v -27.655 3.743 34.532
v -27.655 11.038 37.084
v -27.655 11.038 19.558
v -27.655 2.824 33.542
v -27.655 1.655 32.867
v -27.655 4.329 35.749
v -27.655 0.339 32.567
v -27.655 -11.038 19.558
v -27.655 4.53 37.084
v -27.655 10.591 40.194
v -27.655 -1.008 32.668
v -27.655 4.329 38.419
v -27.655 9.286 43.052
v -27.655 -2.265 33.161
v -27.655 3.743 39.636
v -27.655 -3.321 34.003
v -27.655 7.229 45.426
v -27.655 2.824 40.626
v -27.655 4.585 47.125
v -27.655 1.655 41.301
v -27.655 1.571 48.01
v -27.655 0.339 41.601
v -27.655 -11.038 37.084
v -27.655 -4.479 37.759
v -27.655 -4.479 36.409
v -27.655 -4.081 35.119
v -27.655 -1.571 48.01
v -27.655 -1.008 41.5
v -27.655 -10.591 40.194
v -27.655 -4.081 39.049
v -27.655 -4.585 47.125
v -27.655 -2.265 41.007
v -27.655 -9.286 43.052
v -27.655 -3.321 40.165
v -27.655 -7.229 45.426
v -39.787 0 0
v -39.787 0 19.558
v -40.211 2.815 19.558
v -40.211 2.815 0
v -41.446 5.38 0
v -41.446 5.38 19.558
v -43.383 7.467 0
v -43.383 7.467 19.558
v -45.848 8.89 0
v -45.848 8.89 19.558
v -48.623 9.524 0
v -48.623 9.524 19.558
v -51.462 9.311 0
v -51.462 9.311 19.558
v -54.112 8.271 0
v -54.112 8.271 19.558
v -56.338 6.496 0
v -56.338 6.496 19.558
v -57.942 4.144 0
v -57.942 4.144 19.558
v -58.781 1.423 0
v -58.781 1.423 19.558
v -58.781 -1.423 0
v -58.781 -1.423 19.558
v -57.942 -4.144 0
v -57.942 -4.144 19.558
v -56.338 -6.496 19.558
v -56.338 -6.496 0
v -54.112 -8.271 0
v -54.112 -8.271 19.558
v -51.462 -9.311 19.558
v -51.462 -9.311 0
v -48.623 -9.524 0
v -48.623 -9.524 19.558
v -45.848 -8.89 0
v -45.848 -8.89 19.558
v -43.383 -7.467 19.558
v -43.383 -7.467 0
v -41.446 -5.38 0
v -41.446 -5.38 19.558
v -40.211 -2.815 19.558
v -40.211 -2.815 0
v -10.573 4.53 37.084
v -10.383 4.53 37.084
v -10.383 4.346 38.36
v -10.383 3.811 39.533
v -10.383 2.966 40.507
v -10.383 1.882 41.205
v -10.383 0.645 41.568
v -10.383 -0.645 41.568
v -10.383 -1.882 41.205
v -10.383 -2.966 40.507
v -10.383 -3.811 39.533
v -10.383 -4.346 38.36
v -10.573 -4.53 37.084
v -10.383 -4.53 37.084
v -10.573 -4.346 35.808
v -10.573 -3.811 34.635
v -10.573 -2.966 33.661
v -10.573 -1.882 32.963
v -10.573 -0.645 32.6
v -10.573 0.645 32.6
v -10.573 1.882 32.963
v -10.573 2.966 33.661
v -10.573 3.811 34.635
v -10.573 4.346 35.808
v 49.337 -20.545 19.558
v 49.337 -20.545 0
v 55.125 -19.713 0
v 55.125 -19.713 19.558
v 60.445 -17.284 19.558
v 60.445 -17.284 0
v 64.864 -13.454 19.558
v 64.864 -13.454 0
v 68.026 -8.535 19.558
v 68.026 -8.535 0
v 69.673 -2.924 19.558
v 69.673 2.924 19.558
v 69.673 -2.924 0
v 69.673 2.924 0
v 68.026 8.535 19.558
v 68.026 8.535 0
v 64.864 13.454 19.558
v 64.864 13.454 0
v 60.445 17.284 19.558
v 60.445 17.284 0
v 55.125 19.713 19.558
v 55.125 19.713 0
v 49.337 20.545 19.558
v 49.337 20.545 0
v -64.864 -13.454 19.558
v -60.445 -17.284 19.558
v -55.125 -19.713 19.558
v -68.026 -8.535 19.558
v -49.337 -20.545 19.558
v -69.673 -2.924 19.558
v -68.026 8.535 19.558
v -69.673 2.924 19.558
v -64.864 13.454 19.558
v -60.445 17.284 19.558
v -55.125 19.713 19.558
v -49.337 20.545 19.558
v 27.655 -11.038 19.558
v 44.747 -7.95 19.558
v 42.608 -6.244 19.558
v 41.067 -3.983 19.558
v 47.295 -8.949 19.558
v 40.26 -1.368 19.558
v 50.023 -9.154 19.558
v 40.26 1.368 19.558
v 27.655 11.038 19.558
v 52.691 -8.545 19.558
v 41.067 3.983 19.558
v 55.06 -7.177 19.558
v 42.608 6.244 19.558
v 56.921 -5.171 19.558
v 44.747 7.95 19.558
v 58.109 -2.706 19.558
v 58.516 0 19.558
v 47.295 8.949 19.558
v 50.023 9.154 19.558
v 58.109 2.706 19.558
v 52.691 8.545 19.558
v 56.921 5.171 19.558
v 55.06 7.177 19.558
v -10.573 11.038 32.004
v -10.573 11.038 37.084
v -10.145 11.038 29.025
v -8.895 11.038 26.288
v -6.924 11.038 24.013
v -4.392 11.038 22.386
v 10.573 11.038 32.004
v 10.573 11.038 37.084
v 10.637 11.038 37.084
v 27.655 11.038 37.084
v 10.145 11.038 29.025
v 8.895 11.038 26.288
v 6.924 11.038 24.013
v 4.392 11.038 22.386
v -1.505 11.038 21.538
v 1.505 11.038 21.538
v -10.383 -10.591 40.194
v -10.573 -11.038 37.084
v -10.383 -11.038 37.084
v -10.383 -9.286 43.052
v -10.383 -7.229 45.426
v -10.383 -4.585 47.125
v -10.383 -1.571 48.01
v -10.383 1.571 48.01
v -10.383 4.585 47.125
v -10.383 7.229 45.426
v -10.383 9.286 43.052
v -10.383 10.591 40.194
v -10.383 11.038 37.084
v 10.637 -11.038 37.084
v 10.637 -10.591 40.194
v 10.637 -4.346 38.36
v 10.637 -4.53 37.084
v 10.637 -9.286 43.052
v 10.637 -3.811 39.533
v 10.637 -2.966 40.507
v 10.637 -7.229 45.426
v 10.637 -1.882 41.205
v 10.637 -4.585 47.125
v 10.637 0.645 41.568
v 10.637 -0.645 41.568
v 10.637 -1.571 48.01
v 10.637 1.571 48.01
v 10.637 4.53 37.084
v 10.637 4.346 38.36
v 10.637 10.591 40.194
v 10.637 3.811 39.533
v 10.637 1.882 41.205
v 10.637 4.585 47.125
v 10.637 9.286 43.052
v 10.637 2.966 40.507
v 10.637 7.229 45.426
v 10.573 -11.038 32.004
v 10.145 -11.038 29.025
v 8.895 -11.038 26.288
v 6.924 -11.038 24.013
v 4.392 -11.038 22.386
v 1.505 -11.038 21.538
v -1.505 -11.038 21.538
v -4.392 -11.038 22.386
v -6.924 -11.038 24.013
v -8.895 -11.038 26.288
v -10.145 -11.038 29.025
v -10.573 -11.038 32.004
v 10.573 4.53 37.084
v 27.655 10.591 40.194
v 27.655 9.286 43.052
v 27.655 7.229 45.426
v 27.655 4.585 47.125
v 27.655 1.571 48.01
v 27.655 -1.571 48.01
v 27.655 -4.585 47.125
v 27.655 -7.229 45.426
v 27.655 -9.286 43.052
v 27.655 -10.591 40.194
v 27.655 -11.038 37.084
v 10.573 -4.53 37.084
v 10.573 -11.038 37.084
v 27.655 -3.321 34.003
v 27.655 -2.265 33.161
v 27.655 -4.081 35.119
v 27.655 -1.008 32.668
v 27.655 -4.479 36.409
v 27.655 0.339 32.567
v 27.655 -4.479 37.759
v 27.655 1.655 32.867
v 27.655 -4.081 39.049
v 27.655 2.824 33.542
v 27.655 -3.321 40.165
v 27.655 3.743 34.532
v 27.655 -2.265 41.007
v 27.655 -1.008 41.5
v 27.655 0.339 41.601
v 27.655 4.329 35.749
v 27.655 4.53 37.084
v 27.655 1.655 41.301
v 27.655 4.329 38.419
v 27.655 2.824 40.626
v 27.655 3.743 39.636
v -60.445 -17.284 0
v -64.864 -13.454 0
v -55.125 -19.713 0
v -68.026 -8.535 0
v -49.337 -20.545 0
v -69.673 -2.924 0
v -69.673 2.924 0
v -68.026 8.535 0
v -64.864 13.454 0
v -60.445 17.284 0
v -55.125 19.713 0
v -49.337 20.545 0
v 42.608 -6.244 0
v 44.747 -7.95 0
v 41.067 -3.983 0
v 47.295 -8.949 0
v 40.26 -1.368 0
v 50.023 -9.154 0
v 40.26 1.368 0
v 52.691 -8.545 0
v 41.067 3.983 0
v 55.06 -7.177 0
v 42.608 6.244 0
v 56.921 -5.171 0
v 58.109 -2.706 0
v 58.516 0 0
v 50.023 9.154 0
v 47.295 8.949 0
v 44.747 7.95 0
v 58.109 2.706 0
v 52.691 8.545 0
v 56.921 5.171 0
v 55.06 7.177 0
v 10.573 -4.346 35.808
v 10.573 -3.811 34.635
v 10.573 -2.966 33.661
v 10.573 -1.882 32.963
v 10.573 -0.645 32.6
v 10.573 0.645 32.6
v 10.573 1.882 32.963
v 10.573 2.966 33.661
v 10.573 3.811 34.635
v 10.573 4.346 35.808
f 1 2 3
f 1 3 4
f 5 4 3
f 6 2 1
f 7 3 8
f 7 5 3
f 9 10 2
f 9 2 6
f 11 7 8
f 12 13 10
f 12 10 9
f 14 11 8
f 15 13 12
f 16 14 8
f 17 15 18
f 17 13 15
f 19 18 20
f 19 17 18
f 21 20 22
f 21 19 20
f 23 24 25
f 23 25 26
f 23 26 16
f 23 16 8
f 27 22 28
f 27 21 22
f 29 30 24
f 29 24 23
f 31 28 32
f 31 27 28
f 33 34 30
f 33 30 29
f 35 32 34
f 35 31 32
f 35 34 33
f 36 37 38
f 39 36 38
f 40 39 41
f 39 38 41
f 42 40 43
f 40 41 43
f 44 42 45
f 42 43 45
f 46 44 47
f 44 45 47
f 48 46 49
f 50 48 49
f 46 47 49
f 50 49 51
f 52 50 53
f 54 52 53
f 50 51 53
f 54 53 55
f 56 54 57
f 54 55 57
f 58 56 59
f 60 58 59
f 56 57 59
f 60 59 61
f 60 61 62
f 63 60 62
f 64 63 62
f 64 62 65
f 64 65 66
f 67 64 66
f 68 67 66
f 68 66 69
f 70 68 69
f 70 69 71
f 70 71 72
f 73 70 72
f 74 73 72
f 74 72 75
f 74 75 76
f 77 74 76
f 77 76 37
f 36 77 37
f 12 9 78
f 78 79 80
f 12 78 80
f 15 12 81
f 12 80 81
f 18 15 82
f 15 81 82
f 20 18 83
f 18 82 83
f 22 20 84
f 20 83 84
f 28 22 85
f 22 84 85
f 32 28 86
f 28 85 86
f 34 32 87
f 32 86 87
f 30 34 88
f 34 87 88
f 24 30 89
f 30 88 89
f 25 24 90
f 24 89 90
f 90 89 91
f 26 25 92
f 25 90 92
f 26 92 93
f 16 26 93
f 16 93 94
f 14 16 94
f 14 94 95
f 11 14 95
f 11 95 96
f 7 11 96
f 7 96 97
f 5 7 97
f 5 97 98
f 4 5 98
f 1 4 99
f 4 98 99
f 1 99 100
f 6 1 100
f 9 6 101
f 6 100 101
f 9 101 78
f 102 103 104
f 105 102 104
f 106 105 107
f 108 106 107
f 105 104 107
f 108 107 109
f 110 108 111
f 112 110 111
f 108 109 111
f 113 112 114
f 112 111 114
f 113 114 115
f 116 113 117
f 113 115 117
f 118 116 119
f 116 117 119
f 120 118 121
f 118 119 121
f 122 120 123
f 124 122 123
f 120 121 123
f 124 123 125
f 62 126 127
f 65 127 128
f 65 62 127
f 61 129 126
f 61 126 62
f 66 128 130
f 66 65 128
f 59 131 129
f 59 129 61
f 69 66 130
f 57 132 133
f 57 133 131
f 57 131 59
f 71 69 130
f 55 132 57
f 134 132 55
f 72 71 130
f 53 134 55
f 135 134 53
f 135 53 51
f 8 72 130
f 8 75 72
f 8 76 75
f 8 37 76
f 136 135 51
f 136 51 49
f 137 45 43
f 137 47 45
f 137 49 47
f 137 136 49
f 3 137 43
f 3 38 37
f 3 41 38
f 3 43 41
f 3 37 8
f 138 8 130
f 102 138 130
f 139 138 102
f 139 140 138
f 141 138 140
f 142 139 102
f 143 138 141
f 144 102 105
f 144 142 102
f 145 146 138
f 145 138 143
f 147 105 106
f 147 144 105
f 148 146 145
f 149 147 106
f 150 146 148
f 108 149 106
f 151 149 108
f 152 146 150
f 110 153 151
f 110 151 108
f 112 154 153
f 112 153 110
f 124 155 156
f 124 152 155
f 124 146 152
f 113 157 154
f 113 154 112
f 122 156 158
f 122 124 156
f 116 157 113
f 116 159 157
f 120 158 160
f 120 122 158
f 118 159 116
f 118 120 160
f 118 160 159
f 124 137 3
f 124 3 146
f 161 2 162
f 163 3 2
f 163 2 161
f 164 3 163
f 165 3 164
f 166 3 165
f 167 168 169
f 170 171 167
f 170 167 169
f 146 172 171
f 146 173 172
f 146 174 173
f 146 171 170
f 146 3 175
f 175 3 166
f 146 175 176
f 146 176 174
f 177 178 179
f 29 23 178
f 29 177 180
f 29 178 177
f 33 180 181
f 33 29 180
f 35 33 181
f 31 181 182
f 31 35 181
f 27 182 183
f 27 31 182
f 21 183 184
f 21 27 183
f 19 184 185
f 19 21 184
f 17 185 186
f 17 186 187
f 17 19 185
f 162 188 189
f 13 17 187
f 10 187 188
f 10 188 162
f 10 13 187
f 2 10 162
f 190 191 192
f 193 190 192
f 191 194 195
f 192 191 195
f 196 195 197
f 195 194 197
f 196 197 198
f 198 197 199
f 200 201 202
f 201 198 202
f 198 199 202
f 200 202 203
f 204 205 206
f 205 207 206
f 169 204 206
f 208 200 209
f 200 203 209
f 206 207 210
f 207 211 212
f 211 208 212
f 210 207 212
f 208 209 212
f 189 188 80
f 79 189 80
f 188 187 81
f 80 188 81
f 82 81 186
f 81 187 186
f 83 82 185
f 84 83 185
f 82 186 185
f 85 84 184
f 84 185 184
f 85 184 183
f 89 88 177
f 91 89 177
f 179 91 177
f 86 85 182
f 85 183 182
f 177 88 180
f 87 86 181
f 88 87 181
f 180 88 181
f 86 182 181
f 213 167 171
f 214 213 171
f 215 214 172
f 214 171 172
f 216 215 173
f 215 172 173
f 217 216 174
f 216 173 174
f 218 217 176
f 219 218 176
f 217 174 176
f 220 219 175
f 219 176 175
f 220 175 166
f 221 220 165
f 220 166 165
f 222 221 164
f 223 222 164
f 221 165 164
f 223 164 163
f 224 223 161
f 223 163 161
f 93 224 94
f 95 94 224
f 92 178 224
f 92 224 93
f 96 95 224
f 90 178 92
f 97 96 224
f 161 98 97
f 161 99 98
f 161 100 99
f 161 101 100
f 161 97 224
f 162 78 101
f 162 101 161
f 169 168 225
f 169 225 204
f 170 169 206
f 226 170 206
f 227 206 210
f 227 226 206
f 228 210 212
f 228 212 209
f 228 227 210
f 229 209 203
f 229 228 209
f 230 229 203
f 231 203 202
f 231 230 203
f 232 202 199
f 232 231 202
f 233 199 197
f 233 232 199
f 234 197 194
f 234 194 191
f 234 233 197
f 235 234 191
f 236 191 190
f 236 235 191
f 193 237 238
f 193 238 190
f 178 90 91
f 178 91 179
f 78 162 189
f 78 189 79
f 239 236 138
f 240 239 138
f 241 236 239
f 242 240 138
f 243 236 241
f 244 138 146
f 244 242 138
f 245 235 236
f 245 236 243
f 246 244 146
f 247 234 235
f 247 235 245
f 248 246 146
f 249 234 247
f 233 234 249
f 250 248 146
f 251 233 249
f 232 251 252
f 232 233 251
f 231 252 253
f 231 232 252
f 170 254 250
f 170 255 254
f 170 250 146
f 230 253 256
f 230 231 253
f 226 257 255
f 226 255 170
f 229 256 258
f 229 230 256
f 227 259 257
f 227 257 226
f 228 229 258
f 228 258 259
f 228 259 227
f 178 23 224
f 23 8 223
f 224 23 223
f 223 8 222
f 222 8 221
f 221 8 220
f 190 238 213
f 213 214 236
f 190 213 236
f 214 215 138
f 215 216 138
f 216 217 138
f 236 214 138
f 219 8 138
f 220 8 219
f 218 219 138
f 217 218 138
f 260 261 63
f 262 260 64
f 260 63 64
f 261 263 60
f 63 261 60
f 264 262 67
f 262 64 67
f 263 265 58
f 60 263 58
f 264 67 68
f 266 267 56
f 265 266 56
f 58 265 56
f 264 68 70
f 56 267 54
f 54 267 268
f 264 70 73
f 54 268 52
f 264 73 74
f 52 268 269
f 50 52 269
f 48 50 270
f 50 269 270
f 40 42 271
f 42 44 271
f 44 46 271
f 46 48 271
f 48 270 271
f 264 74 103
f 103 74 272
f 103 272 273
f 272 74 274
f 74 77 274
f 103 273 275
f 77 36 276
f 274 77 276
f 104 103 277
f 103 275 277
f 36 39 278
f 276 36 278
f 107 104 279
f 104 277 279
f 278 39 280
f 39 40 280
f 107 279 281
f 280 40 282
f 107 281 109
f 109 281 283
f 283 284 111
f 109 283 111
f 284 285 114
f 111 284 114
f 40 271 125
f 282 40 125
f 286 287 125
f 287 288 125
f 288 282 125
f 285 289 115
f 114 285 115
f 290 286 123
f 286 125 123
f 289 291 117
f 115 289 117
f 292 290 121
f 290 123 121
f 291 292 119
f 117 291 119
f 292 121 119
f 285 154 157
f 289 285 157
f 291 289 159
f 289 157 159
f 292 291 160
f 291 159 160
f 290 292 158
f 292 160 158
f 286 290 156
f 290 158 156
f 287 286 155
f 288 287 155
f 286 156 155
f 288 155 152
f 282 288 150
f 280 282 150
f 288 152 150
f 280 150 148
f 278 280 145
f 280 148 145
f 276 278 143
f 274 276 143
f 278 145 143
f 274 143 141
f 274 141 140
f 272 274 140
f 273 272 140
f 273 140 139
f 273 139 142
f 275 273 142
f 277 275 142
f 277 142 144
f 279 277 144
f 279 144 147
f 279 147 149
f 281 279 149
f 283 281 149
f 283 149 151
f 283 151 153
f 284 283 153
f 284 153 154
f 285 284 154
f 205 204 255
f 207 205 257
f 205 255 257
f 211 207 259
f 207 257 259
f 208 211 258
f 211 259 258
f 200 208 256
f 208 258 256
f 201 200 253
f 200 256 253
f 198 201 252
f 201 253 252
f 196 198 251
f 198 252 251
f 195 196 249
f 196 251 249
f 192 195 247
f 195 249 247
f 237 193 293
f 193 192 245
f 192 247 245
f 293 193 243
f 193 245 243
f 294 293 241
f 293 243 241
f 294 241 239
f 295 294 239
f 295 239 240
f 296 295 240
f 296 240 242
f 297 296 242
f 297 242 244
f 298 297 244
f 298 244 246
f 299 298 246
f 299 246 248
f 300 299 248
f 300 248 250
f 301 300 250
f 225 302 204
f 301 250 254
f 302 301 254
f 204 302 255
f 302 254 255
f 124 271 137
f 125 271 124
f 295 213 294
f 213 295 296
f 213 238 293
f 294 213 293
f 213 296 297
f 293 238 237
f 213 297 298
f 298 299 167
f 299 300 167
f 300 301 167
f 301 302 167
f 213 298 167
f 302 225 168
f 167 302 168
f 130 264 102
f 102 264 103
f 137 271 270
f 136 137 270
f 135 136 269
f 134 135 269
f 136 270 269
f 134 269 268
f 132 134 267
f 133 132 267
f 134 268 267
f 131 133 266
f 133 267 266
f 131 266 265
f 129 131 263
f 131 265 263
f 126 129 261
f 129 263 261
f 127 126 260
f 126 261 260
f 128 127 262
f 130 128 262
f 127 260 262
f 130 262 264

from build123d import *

# Parameters (mm, degrees)
F0_W      = 98.6741781235
F0_H      = 41.0901270807
F1_DEPTH  = 19.558
F2_R      = 9.1792961358
F2_R_2    = 9.5503911514
F3_DEPTH  = 38.354
F4_W      = 55.3103350103
F4_H      = 22.0765508711
F5_DEPTH  = 17.526
F6_W      = 21.1468022317
F6_H      = 22.0765508711
F7_DEPTH  = 5.08
F9_DEPTH  = 159.766
F11_DEPTH = 17.018
F13_DEPTH = 17.272
F14_R     = 4.5299196653
F15_DEPTH = 118.872


with BuildPart() as f1:
    # F0 (on Top) → F1 (new body)
    with BuildSketch(Plane.XY):
        Rectangle(F0_W, F0_H)
        with BuildLine():
            ThreePointArc((49.3370890617, -20.5450635403), (69.8821526021, 0), (49.3370890617, 20.5450635403))
            Line((49.3370890617, 20.5450635403), (49.3370890617, -20.5450635403))
        make_face()
        with BuildLine():
            Line((-49.3370890617, -20.5450635403), (-49.3370890617, 20.5450635403))
            ThreePointArc((-49.3370890617, 20.5450635403), (-69.8821526021, 0), (-49.3370890617, -20.5450635403))
        make_face()
    extrude(amount=F1_DEPTH)

    # F2 (on face) → F3 (cut)
    with BuildSketch(Plane.XY.offset(19.558)):
        with Locations((49.3370890617, 0)):
            Circle(F2_R)
        with Locations((-49.3370890617, 0)):
            Circle(F2_R_2)
    extrude(amount=-F3_DEPTH, mode=Mode.SUBTRACT)

    # F4 (on face) → F5 (join)
    with BuildSketch(Plane.XY.offset(19.558)):
        Rectangle(F4_W, F4_H)
    extrude(amount=F5_DEPTH)

    # F6 (on face) → F7 (cut)
    with BuildSketch(Plane.XY.offset(37.084)):
        Rectangle(F6_W, F6_H)
    extrude(amount=-F7_DEPTH, mode=Mode.SUBTRACT)

    # F8 (on face) → F9 (cut)
    with BuildSketch(Plane(origin=(0, 11.0382754356, 0), x_dir=(-1, 0, 0), z_dir=(0, 1, 0))):
        with BuildLine():
            Line((10.5734011158, 32.004), (-10.5734011158, 32.004))
            ThreePointArc((-10.5734011158, 32.004), (0, 21.4305988842), (10.5734011158, 32.004))
        make_face()
    extrude(amount=-F9_DEPTH, mode=Mode.SUBTRACT)

    # F10 (on face) → F11 (join)
    with BuildSketch(Plane.YZ.offset(27.6551675051)):
        with BuildLine():
            Line((-11.0382754356, 37.084), (11.0382754356, 37.084))
            ThreePointArc((11.0382754356, 37.084), (0, 48.1222754356), (-11.0382754356, 37.084))
        make_face()
    extrude(amount=-F11_DEPTH)

    # F12 (on face) → F13 (join)
    with BuildSketch(Plane(origin=(-27.6551675051, 0, 0), x_dir=(0, -1, 0), z_dir=(-1, 0, 0))):
        with BuildLine():
            Line((-11.0382754356, 37.084), (11.0382754356, 37.084))
            ThreePointArc((11.0382754356, 37.084), (0, 48.1222754356), (-11.0382754356, 37.084))
        make_face()
    extrude(amount=-F13_DEPTH)

    # F14 (on face) → F15 (cut)
    with BuildSketch(Plane.YZ.offset(27.6551675051)):
        with Locations((0, 37.084)):
            Circle(F14_R)
    extrude(amount=-F15_DEPTH, mode=Mode.SUBTRACT)


solid = f1.part
